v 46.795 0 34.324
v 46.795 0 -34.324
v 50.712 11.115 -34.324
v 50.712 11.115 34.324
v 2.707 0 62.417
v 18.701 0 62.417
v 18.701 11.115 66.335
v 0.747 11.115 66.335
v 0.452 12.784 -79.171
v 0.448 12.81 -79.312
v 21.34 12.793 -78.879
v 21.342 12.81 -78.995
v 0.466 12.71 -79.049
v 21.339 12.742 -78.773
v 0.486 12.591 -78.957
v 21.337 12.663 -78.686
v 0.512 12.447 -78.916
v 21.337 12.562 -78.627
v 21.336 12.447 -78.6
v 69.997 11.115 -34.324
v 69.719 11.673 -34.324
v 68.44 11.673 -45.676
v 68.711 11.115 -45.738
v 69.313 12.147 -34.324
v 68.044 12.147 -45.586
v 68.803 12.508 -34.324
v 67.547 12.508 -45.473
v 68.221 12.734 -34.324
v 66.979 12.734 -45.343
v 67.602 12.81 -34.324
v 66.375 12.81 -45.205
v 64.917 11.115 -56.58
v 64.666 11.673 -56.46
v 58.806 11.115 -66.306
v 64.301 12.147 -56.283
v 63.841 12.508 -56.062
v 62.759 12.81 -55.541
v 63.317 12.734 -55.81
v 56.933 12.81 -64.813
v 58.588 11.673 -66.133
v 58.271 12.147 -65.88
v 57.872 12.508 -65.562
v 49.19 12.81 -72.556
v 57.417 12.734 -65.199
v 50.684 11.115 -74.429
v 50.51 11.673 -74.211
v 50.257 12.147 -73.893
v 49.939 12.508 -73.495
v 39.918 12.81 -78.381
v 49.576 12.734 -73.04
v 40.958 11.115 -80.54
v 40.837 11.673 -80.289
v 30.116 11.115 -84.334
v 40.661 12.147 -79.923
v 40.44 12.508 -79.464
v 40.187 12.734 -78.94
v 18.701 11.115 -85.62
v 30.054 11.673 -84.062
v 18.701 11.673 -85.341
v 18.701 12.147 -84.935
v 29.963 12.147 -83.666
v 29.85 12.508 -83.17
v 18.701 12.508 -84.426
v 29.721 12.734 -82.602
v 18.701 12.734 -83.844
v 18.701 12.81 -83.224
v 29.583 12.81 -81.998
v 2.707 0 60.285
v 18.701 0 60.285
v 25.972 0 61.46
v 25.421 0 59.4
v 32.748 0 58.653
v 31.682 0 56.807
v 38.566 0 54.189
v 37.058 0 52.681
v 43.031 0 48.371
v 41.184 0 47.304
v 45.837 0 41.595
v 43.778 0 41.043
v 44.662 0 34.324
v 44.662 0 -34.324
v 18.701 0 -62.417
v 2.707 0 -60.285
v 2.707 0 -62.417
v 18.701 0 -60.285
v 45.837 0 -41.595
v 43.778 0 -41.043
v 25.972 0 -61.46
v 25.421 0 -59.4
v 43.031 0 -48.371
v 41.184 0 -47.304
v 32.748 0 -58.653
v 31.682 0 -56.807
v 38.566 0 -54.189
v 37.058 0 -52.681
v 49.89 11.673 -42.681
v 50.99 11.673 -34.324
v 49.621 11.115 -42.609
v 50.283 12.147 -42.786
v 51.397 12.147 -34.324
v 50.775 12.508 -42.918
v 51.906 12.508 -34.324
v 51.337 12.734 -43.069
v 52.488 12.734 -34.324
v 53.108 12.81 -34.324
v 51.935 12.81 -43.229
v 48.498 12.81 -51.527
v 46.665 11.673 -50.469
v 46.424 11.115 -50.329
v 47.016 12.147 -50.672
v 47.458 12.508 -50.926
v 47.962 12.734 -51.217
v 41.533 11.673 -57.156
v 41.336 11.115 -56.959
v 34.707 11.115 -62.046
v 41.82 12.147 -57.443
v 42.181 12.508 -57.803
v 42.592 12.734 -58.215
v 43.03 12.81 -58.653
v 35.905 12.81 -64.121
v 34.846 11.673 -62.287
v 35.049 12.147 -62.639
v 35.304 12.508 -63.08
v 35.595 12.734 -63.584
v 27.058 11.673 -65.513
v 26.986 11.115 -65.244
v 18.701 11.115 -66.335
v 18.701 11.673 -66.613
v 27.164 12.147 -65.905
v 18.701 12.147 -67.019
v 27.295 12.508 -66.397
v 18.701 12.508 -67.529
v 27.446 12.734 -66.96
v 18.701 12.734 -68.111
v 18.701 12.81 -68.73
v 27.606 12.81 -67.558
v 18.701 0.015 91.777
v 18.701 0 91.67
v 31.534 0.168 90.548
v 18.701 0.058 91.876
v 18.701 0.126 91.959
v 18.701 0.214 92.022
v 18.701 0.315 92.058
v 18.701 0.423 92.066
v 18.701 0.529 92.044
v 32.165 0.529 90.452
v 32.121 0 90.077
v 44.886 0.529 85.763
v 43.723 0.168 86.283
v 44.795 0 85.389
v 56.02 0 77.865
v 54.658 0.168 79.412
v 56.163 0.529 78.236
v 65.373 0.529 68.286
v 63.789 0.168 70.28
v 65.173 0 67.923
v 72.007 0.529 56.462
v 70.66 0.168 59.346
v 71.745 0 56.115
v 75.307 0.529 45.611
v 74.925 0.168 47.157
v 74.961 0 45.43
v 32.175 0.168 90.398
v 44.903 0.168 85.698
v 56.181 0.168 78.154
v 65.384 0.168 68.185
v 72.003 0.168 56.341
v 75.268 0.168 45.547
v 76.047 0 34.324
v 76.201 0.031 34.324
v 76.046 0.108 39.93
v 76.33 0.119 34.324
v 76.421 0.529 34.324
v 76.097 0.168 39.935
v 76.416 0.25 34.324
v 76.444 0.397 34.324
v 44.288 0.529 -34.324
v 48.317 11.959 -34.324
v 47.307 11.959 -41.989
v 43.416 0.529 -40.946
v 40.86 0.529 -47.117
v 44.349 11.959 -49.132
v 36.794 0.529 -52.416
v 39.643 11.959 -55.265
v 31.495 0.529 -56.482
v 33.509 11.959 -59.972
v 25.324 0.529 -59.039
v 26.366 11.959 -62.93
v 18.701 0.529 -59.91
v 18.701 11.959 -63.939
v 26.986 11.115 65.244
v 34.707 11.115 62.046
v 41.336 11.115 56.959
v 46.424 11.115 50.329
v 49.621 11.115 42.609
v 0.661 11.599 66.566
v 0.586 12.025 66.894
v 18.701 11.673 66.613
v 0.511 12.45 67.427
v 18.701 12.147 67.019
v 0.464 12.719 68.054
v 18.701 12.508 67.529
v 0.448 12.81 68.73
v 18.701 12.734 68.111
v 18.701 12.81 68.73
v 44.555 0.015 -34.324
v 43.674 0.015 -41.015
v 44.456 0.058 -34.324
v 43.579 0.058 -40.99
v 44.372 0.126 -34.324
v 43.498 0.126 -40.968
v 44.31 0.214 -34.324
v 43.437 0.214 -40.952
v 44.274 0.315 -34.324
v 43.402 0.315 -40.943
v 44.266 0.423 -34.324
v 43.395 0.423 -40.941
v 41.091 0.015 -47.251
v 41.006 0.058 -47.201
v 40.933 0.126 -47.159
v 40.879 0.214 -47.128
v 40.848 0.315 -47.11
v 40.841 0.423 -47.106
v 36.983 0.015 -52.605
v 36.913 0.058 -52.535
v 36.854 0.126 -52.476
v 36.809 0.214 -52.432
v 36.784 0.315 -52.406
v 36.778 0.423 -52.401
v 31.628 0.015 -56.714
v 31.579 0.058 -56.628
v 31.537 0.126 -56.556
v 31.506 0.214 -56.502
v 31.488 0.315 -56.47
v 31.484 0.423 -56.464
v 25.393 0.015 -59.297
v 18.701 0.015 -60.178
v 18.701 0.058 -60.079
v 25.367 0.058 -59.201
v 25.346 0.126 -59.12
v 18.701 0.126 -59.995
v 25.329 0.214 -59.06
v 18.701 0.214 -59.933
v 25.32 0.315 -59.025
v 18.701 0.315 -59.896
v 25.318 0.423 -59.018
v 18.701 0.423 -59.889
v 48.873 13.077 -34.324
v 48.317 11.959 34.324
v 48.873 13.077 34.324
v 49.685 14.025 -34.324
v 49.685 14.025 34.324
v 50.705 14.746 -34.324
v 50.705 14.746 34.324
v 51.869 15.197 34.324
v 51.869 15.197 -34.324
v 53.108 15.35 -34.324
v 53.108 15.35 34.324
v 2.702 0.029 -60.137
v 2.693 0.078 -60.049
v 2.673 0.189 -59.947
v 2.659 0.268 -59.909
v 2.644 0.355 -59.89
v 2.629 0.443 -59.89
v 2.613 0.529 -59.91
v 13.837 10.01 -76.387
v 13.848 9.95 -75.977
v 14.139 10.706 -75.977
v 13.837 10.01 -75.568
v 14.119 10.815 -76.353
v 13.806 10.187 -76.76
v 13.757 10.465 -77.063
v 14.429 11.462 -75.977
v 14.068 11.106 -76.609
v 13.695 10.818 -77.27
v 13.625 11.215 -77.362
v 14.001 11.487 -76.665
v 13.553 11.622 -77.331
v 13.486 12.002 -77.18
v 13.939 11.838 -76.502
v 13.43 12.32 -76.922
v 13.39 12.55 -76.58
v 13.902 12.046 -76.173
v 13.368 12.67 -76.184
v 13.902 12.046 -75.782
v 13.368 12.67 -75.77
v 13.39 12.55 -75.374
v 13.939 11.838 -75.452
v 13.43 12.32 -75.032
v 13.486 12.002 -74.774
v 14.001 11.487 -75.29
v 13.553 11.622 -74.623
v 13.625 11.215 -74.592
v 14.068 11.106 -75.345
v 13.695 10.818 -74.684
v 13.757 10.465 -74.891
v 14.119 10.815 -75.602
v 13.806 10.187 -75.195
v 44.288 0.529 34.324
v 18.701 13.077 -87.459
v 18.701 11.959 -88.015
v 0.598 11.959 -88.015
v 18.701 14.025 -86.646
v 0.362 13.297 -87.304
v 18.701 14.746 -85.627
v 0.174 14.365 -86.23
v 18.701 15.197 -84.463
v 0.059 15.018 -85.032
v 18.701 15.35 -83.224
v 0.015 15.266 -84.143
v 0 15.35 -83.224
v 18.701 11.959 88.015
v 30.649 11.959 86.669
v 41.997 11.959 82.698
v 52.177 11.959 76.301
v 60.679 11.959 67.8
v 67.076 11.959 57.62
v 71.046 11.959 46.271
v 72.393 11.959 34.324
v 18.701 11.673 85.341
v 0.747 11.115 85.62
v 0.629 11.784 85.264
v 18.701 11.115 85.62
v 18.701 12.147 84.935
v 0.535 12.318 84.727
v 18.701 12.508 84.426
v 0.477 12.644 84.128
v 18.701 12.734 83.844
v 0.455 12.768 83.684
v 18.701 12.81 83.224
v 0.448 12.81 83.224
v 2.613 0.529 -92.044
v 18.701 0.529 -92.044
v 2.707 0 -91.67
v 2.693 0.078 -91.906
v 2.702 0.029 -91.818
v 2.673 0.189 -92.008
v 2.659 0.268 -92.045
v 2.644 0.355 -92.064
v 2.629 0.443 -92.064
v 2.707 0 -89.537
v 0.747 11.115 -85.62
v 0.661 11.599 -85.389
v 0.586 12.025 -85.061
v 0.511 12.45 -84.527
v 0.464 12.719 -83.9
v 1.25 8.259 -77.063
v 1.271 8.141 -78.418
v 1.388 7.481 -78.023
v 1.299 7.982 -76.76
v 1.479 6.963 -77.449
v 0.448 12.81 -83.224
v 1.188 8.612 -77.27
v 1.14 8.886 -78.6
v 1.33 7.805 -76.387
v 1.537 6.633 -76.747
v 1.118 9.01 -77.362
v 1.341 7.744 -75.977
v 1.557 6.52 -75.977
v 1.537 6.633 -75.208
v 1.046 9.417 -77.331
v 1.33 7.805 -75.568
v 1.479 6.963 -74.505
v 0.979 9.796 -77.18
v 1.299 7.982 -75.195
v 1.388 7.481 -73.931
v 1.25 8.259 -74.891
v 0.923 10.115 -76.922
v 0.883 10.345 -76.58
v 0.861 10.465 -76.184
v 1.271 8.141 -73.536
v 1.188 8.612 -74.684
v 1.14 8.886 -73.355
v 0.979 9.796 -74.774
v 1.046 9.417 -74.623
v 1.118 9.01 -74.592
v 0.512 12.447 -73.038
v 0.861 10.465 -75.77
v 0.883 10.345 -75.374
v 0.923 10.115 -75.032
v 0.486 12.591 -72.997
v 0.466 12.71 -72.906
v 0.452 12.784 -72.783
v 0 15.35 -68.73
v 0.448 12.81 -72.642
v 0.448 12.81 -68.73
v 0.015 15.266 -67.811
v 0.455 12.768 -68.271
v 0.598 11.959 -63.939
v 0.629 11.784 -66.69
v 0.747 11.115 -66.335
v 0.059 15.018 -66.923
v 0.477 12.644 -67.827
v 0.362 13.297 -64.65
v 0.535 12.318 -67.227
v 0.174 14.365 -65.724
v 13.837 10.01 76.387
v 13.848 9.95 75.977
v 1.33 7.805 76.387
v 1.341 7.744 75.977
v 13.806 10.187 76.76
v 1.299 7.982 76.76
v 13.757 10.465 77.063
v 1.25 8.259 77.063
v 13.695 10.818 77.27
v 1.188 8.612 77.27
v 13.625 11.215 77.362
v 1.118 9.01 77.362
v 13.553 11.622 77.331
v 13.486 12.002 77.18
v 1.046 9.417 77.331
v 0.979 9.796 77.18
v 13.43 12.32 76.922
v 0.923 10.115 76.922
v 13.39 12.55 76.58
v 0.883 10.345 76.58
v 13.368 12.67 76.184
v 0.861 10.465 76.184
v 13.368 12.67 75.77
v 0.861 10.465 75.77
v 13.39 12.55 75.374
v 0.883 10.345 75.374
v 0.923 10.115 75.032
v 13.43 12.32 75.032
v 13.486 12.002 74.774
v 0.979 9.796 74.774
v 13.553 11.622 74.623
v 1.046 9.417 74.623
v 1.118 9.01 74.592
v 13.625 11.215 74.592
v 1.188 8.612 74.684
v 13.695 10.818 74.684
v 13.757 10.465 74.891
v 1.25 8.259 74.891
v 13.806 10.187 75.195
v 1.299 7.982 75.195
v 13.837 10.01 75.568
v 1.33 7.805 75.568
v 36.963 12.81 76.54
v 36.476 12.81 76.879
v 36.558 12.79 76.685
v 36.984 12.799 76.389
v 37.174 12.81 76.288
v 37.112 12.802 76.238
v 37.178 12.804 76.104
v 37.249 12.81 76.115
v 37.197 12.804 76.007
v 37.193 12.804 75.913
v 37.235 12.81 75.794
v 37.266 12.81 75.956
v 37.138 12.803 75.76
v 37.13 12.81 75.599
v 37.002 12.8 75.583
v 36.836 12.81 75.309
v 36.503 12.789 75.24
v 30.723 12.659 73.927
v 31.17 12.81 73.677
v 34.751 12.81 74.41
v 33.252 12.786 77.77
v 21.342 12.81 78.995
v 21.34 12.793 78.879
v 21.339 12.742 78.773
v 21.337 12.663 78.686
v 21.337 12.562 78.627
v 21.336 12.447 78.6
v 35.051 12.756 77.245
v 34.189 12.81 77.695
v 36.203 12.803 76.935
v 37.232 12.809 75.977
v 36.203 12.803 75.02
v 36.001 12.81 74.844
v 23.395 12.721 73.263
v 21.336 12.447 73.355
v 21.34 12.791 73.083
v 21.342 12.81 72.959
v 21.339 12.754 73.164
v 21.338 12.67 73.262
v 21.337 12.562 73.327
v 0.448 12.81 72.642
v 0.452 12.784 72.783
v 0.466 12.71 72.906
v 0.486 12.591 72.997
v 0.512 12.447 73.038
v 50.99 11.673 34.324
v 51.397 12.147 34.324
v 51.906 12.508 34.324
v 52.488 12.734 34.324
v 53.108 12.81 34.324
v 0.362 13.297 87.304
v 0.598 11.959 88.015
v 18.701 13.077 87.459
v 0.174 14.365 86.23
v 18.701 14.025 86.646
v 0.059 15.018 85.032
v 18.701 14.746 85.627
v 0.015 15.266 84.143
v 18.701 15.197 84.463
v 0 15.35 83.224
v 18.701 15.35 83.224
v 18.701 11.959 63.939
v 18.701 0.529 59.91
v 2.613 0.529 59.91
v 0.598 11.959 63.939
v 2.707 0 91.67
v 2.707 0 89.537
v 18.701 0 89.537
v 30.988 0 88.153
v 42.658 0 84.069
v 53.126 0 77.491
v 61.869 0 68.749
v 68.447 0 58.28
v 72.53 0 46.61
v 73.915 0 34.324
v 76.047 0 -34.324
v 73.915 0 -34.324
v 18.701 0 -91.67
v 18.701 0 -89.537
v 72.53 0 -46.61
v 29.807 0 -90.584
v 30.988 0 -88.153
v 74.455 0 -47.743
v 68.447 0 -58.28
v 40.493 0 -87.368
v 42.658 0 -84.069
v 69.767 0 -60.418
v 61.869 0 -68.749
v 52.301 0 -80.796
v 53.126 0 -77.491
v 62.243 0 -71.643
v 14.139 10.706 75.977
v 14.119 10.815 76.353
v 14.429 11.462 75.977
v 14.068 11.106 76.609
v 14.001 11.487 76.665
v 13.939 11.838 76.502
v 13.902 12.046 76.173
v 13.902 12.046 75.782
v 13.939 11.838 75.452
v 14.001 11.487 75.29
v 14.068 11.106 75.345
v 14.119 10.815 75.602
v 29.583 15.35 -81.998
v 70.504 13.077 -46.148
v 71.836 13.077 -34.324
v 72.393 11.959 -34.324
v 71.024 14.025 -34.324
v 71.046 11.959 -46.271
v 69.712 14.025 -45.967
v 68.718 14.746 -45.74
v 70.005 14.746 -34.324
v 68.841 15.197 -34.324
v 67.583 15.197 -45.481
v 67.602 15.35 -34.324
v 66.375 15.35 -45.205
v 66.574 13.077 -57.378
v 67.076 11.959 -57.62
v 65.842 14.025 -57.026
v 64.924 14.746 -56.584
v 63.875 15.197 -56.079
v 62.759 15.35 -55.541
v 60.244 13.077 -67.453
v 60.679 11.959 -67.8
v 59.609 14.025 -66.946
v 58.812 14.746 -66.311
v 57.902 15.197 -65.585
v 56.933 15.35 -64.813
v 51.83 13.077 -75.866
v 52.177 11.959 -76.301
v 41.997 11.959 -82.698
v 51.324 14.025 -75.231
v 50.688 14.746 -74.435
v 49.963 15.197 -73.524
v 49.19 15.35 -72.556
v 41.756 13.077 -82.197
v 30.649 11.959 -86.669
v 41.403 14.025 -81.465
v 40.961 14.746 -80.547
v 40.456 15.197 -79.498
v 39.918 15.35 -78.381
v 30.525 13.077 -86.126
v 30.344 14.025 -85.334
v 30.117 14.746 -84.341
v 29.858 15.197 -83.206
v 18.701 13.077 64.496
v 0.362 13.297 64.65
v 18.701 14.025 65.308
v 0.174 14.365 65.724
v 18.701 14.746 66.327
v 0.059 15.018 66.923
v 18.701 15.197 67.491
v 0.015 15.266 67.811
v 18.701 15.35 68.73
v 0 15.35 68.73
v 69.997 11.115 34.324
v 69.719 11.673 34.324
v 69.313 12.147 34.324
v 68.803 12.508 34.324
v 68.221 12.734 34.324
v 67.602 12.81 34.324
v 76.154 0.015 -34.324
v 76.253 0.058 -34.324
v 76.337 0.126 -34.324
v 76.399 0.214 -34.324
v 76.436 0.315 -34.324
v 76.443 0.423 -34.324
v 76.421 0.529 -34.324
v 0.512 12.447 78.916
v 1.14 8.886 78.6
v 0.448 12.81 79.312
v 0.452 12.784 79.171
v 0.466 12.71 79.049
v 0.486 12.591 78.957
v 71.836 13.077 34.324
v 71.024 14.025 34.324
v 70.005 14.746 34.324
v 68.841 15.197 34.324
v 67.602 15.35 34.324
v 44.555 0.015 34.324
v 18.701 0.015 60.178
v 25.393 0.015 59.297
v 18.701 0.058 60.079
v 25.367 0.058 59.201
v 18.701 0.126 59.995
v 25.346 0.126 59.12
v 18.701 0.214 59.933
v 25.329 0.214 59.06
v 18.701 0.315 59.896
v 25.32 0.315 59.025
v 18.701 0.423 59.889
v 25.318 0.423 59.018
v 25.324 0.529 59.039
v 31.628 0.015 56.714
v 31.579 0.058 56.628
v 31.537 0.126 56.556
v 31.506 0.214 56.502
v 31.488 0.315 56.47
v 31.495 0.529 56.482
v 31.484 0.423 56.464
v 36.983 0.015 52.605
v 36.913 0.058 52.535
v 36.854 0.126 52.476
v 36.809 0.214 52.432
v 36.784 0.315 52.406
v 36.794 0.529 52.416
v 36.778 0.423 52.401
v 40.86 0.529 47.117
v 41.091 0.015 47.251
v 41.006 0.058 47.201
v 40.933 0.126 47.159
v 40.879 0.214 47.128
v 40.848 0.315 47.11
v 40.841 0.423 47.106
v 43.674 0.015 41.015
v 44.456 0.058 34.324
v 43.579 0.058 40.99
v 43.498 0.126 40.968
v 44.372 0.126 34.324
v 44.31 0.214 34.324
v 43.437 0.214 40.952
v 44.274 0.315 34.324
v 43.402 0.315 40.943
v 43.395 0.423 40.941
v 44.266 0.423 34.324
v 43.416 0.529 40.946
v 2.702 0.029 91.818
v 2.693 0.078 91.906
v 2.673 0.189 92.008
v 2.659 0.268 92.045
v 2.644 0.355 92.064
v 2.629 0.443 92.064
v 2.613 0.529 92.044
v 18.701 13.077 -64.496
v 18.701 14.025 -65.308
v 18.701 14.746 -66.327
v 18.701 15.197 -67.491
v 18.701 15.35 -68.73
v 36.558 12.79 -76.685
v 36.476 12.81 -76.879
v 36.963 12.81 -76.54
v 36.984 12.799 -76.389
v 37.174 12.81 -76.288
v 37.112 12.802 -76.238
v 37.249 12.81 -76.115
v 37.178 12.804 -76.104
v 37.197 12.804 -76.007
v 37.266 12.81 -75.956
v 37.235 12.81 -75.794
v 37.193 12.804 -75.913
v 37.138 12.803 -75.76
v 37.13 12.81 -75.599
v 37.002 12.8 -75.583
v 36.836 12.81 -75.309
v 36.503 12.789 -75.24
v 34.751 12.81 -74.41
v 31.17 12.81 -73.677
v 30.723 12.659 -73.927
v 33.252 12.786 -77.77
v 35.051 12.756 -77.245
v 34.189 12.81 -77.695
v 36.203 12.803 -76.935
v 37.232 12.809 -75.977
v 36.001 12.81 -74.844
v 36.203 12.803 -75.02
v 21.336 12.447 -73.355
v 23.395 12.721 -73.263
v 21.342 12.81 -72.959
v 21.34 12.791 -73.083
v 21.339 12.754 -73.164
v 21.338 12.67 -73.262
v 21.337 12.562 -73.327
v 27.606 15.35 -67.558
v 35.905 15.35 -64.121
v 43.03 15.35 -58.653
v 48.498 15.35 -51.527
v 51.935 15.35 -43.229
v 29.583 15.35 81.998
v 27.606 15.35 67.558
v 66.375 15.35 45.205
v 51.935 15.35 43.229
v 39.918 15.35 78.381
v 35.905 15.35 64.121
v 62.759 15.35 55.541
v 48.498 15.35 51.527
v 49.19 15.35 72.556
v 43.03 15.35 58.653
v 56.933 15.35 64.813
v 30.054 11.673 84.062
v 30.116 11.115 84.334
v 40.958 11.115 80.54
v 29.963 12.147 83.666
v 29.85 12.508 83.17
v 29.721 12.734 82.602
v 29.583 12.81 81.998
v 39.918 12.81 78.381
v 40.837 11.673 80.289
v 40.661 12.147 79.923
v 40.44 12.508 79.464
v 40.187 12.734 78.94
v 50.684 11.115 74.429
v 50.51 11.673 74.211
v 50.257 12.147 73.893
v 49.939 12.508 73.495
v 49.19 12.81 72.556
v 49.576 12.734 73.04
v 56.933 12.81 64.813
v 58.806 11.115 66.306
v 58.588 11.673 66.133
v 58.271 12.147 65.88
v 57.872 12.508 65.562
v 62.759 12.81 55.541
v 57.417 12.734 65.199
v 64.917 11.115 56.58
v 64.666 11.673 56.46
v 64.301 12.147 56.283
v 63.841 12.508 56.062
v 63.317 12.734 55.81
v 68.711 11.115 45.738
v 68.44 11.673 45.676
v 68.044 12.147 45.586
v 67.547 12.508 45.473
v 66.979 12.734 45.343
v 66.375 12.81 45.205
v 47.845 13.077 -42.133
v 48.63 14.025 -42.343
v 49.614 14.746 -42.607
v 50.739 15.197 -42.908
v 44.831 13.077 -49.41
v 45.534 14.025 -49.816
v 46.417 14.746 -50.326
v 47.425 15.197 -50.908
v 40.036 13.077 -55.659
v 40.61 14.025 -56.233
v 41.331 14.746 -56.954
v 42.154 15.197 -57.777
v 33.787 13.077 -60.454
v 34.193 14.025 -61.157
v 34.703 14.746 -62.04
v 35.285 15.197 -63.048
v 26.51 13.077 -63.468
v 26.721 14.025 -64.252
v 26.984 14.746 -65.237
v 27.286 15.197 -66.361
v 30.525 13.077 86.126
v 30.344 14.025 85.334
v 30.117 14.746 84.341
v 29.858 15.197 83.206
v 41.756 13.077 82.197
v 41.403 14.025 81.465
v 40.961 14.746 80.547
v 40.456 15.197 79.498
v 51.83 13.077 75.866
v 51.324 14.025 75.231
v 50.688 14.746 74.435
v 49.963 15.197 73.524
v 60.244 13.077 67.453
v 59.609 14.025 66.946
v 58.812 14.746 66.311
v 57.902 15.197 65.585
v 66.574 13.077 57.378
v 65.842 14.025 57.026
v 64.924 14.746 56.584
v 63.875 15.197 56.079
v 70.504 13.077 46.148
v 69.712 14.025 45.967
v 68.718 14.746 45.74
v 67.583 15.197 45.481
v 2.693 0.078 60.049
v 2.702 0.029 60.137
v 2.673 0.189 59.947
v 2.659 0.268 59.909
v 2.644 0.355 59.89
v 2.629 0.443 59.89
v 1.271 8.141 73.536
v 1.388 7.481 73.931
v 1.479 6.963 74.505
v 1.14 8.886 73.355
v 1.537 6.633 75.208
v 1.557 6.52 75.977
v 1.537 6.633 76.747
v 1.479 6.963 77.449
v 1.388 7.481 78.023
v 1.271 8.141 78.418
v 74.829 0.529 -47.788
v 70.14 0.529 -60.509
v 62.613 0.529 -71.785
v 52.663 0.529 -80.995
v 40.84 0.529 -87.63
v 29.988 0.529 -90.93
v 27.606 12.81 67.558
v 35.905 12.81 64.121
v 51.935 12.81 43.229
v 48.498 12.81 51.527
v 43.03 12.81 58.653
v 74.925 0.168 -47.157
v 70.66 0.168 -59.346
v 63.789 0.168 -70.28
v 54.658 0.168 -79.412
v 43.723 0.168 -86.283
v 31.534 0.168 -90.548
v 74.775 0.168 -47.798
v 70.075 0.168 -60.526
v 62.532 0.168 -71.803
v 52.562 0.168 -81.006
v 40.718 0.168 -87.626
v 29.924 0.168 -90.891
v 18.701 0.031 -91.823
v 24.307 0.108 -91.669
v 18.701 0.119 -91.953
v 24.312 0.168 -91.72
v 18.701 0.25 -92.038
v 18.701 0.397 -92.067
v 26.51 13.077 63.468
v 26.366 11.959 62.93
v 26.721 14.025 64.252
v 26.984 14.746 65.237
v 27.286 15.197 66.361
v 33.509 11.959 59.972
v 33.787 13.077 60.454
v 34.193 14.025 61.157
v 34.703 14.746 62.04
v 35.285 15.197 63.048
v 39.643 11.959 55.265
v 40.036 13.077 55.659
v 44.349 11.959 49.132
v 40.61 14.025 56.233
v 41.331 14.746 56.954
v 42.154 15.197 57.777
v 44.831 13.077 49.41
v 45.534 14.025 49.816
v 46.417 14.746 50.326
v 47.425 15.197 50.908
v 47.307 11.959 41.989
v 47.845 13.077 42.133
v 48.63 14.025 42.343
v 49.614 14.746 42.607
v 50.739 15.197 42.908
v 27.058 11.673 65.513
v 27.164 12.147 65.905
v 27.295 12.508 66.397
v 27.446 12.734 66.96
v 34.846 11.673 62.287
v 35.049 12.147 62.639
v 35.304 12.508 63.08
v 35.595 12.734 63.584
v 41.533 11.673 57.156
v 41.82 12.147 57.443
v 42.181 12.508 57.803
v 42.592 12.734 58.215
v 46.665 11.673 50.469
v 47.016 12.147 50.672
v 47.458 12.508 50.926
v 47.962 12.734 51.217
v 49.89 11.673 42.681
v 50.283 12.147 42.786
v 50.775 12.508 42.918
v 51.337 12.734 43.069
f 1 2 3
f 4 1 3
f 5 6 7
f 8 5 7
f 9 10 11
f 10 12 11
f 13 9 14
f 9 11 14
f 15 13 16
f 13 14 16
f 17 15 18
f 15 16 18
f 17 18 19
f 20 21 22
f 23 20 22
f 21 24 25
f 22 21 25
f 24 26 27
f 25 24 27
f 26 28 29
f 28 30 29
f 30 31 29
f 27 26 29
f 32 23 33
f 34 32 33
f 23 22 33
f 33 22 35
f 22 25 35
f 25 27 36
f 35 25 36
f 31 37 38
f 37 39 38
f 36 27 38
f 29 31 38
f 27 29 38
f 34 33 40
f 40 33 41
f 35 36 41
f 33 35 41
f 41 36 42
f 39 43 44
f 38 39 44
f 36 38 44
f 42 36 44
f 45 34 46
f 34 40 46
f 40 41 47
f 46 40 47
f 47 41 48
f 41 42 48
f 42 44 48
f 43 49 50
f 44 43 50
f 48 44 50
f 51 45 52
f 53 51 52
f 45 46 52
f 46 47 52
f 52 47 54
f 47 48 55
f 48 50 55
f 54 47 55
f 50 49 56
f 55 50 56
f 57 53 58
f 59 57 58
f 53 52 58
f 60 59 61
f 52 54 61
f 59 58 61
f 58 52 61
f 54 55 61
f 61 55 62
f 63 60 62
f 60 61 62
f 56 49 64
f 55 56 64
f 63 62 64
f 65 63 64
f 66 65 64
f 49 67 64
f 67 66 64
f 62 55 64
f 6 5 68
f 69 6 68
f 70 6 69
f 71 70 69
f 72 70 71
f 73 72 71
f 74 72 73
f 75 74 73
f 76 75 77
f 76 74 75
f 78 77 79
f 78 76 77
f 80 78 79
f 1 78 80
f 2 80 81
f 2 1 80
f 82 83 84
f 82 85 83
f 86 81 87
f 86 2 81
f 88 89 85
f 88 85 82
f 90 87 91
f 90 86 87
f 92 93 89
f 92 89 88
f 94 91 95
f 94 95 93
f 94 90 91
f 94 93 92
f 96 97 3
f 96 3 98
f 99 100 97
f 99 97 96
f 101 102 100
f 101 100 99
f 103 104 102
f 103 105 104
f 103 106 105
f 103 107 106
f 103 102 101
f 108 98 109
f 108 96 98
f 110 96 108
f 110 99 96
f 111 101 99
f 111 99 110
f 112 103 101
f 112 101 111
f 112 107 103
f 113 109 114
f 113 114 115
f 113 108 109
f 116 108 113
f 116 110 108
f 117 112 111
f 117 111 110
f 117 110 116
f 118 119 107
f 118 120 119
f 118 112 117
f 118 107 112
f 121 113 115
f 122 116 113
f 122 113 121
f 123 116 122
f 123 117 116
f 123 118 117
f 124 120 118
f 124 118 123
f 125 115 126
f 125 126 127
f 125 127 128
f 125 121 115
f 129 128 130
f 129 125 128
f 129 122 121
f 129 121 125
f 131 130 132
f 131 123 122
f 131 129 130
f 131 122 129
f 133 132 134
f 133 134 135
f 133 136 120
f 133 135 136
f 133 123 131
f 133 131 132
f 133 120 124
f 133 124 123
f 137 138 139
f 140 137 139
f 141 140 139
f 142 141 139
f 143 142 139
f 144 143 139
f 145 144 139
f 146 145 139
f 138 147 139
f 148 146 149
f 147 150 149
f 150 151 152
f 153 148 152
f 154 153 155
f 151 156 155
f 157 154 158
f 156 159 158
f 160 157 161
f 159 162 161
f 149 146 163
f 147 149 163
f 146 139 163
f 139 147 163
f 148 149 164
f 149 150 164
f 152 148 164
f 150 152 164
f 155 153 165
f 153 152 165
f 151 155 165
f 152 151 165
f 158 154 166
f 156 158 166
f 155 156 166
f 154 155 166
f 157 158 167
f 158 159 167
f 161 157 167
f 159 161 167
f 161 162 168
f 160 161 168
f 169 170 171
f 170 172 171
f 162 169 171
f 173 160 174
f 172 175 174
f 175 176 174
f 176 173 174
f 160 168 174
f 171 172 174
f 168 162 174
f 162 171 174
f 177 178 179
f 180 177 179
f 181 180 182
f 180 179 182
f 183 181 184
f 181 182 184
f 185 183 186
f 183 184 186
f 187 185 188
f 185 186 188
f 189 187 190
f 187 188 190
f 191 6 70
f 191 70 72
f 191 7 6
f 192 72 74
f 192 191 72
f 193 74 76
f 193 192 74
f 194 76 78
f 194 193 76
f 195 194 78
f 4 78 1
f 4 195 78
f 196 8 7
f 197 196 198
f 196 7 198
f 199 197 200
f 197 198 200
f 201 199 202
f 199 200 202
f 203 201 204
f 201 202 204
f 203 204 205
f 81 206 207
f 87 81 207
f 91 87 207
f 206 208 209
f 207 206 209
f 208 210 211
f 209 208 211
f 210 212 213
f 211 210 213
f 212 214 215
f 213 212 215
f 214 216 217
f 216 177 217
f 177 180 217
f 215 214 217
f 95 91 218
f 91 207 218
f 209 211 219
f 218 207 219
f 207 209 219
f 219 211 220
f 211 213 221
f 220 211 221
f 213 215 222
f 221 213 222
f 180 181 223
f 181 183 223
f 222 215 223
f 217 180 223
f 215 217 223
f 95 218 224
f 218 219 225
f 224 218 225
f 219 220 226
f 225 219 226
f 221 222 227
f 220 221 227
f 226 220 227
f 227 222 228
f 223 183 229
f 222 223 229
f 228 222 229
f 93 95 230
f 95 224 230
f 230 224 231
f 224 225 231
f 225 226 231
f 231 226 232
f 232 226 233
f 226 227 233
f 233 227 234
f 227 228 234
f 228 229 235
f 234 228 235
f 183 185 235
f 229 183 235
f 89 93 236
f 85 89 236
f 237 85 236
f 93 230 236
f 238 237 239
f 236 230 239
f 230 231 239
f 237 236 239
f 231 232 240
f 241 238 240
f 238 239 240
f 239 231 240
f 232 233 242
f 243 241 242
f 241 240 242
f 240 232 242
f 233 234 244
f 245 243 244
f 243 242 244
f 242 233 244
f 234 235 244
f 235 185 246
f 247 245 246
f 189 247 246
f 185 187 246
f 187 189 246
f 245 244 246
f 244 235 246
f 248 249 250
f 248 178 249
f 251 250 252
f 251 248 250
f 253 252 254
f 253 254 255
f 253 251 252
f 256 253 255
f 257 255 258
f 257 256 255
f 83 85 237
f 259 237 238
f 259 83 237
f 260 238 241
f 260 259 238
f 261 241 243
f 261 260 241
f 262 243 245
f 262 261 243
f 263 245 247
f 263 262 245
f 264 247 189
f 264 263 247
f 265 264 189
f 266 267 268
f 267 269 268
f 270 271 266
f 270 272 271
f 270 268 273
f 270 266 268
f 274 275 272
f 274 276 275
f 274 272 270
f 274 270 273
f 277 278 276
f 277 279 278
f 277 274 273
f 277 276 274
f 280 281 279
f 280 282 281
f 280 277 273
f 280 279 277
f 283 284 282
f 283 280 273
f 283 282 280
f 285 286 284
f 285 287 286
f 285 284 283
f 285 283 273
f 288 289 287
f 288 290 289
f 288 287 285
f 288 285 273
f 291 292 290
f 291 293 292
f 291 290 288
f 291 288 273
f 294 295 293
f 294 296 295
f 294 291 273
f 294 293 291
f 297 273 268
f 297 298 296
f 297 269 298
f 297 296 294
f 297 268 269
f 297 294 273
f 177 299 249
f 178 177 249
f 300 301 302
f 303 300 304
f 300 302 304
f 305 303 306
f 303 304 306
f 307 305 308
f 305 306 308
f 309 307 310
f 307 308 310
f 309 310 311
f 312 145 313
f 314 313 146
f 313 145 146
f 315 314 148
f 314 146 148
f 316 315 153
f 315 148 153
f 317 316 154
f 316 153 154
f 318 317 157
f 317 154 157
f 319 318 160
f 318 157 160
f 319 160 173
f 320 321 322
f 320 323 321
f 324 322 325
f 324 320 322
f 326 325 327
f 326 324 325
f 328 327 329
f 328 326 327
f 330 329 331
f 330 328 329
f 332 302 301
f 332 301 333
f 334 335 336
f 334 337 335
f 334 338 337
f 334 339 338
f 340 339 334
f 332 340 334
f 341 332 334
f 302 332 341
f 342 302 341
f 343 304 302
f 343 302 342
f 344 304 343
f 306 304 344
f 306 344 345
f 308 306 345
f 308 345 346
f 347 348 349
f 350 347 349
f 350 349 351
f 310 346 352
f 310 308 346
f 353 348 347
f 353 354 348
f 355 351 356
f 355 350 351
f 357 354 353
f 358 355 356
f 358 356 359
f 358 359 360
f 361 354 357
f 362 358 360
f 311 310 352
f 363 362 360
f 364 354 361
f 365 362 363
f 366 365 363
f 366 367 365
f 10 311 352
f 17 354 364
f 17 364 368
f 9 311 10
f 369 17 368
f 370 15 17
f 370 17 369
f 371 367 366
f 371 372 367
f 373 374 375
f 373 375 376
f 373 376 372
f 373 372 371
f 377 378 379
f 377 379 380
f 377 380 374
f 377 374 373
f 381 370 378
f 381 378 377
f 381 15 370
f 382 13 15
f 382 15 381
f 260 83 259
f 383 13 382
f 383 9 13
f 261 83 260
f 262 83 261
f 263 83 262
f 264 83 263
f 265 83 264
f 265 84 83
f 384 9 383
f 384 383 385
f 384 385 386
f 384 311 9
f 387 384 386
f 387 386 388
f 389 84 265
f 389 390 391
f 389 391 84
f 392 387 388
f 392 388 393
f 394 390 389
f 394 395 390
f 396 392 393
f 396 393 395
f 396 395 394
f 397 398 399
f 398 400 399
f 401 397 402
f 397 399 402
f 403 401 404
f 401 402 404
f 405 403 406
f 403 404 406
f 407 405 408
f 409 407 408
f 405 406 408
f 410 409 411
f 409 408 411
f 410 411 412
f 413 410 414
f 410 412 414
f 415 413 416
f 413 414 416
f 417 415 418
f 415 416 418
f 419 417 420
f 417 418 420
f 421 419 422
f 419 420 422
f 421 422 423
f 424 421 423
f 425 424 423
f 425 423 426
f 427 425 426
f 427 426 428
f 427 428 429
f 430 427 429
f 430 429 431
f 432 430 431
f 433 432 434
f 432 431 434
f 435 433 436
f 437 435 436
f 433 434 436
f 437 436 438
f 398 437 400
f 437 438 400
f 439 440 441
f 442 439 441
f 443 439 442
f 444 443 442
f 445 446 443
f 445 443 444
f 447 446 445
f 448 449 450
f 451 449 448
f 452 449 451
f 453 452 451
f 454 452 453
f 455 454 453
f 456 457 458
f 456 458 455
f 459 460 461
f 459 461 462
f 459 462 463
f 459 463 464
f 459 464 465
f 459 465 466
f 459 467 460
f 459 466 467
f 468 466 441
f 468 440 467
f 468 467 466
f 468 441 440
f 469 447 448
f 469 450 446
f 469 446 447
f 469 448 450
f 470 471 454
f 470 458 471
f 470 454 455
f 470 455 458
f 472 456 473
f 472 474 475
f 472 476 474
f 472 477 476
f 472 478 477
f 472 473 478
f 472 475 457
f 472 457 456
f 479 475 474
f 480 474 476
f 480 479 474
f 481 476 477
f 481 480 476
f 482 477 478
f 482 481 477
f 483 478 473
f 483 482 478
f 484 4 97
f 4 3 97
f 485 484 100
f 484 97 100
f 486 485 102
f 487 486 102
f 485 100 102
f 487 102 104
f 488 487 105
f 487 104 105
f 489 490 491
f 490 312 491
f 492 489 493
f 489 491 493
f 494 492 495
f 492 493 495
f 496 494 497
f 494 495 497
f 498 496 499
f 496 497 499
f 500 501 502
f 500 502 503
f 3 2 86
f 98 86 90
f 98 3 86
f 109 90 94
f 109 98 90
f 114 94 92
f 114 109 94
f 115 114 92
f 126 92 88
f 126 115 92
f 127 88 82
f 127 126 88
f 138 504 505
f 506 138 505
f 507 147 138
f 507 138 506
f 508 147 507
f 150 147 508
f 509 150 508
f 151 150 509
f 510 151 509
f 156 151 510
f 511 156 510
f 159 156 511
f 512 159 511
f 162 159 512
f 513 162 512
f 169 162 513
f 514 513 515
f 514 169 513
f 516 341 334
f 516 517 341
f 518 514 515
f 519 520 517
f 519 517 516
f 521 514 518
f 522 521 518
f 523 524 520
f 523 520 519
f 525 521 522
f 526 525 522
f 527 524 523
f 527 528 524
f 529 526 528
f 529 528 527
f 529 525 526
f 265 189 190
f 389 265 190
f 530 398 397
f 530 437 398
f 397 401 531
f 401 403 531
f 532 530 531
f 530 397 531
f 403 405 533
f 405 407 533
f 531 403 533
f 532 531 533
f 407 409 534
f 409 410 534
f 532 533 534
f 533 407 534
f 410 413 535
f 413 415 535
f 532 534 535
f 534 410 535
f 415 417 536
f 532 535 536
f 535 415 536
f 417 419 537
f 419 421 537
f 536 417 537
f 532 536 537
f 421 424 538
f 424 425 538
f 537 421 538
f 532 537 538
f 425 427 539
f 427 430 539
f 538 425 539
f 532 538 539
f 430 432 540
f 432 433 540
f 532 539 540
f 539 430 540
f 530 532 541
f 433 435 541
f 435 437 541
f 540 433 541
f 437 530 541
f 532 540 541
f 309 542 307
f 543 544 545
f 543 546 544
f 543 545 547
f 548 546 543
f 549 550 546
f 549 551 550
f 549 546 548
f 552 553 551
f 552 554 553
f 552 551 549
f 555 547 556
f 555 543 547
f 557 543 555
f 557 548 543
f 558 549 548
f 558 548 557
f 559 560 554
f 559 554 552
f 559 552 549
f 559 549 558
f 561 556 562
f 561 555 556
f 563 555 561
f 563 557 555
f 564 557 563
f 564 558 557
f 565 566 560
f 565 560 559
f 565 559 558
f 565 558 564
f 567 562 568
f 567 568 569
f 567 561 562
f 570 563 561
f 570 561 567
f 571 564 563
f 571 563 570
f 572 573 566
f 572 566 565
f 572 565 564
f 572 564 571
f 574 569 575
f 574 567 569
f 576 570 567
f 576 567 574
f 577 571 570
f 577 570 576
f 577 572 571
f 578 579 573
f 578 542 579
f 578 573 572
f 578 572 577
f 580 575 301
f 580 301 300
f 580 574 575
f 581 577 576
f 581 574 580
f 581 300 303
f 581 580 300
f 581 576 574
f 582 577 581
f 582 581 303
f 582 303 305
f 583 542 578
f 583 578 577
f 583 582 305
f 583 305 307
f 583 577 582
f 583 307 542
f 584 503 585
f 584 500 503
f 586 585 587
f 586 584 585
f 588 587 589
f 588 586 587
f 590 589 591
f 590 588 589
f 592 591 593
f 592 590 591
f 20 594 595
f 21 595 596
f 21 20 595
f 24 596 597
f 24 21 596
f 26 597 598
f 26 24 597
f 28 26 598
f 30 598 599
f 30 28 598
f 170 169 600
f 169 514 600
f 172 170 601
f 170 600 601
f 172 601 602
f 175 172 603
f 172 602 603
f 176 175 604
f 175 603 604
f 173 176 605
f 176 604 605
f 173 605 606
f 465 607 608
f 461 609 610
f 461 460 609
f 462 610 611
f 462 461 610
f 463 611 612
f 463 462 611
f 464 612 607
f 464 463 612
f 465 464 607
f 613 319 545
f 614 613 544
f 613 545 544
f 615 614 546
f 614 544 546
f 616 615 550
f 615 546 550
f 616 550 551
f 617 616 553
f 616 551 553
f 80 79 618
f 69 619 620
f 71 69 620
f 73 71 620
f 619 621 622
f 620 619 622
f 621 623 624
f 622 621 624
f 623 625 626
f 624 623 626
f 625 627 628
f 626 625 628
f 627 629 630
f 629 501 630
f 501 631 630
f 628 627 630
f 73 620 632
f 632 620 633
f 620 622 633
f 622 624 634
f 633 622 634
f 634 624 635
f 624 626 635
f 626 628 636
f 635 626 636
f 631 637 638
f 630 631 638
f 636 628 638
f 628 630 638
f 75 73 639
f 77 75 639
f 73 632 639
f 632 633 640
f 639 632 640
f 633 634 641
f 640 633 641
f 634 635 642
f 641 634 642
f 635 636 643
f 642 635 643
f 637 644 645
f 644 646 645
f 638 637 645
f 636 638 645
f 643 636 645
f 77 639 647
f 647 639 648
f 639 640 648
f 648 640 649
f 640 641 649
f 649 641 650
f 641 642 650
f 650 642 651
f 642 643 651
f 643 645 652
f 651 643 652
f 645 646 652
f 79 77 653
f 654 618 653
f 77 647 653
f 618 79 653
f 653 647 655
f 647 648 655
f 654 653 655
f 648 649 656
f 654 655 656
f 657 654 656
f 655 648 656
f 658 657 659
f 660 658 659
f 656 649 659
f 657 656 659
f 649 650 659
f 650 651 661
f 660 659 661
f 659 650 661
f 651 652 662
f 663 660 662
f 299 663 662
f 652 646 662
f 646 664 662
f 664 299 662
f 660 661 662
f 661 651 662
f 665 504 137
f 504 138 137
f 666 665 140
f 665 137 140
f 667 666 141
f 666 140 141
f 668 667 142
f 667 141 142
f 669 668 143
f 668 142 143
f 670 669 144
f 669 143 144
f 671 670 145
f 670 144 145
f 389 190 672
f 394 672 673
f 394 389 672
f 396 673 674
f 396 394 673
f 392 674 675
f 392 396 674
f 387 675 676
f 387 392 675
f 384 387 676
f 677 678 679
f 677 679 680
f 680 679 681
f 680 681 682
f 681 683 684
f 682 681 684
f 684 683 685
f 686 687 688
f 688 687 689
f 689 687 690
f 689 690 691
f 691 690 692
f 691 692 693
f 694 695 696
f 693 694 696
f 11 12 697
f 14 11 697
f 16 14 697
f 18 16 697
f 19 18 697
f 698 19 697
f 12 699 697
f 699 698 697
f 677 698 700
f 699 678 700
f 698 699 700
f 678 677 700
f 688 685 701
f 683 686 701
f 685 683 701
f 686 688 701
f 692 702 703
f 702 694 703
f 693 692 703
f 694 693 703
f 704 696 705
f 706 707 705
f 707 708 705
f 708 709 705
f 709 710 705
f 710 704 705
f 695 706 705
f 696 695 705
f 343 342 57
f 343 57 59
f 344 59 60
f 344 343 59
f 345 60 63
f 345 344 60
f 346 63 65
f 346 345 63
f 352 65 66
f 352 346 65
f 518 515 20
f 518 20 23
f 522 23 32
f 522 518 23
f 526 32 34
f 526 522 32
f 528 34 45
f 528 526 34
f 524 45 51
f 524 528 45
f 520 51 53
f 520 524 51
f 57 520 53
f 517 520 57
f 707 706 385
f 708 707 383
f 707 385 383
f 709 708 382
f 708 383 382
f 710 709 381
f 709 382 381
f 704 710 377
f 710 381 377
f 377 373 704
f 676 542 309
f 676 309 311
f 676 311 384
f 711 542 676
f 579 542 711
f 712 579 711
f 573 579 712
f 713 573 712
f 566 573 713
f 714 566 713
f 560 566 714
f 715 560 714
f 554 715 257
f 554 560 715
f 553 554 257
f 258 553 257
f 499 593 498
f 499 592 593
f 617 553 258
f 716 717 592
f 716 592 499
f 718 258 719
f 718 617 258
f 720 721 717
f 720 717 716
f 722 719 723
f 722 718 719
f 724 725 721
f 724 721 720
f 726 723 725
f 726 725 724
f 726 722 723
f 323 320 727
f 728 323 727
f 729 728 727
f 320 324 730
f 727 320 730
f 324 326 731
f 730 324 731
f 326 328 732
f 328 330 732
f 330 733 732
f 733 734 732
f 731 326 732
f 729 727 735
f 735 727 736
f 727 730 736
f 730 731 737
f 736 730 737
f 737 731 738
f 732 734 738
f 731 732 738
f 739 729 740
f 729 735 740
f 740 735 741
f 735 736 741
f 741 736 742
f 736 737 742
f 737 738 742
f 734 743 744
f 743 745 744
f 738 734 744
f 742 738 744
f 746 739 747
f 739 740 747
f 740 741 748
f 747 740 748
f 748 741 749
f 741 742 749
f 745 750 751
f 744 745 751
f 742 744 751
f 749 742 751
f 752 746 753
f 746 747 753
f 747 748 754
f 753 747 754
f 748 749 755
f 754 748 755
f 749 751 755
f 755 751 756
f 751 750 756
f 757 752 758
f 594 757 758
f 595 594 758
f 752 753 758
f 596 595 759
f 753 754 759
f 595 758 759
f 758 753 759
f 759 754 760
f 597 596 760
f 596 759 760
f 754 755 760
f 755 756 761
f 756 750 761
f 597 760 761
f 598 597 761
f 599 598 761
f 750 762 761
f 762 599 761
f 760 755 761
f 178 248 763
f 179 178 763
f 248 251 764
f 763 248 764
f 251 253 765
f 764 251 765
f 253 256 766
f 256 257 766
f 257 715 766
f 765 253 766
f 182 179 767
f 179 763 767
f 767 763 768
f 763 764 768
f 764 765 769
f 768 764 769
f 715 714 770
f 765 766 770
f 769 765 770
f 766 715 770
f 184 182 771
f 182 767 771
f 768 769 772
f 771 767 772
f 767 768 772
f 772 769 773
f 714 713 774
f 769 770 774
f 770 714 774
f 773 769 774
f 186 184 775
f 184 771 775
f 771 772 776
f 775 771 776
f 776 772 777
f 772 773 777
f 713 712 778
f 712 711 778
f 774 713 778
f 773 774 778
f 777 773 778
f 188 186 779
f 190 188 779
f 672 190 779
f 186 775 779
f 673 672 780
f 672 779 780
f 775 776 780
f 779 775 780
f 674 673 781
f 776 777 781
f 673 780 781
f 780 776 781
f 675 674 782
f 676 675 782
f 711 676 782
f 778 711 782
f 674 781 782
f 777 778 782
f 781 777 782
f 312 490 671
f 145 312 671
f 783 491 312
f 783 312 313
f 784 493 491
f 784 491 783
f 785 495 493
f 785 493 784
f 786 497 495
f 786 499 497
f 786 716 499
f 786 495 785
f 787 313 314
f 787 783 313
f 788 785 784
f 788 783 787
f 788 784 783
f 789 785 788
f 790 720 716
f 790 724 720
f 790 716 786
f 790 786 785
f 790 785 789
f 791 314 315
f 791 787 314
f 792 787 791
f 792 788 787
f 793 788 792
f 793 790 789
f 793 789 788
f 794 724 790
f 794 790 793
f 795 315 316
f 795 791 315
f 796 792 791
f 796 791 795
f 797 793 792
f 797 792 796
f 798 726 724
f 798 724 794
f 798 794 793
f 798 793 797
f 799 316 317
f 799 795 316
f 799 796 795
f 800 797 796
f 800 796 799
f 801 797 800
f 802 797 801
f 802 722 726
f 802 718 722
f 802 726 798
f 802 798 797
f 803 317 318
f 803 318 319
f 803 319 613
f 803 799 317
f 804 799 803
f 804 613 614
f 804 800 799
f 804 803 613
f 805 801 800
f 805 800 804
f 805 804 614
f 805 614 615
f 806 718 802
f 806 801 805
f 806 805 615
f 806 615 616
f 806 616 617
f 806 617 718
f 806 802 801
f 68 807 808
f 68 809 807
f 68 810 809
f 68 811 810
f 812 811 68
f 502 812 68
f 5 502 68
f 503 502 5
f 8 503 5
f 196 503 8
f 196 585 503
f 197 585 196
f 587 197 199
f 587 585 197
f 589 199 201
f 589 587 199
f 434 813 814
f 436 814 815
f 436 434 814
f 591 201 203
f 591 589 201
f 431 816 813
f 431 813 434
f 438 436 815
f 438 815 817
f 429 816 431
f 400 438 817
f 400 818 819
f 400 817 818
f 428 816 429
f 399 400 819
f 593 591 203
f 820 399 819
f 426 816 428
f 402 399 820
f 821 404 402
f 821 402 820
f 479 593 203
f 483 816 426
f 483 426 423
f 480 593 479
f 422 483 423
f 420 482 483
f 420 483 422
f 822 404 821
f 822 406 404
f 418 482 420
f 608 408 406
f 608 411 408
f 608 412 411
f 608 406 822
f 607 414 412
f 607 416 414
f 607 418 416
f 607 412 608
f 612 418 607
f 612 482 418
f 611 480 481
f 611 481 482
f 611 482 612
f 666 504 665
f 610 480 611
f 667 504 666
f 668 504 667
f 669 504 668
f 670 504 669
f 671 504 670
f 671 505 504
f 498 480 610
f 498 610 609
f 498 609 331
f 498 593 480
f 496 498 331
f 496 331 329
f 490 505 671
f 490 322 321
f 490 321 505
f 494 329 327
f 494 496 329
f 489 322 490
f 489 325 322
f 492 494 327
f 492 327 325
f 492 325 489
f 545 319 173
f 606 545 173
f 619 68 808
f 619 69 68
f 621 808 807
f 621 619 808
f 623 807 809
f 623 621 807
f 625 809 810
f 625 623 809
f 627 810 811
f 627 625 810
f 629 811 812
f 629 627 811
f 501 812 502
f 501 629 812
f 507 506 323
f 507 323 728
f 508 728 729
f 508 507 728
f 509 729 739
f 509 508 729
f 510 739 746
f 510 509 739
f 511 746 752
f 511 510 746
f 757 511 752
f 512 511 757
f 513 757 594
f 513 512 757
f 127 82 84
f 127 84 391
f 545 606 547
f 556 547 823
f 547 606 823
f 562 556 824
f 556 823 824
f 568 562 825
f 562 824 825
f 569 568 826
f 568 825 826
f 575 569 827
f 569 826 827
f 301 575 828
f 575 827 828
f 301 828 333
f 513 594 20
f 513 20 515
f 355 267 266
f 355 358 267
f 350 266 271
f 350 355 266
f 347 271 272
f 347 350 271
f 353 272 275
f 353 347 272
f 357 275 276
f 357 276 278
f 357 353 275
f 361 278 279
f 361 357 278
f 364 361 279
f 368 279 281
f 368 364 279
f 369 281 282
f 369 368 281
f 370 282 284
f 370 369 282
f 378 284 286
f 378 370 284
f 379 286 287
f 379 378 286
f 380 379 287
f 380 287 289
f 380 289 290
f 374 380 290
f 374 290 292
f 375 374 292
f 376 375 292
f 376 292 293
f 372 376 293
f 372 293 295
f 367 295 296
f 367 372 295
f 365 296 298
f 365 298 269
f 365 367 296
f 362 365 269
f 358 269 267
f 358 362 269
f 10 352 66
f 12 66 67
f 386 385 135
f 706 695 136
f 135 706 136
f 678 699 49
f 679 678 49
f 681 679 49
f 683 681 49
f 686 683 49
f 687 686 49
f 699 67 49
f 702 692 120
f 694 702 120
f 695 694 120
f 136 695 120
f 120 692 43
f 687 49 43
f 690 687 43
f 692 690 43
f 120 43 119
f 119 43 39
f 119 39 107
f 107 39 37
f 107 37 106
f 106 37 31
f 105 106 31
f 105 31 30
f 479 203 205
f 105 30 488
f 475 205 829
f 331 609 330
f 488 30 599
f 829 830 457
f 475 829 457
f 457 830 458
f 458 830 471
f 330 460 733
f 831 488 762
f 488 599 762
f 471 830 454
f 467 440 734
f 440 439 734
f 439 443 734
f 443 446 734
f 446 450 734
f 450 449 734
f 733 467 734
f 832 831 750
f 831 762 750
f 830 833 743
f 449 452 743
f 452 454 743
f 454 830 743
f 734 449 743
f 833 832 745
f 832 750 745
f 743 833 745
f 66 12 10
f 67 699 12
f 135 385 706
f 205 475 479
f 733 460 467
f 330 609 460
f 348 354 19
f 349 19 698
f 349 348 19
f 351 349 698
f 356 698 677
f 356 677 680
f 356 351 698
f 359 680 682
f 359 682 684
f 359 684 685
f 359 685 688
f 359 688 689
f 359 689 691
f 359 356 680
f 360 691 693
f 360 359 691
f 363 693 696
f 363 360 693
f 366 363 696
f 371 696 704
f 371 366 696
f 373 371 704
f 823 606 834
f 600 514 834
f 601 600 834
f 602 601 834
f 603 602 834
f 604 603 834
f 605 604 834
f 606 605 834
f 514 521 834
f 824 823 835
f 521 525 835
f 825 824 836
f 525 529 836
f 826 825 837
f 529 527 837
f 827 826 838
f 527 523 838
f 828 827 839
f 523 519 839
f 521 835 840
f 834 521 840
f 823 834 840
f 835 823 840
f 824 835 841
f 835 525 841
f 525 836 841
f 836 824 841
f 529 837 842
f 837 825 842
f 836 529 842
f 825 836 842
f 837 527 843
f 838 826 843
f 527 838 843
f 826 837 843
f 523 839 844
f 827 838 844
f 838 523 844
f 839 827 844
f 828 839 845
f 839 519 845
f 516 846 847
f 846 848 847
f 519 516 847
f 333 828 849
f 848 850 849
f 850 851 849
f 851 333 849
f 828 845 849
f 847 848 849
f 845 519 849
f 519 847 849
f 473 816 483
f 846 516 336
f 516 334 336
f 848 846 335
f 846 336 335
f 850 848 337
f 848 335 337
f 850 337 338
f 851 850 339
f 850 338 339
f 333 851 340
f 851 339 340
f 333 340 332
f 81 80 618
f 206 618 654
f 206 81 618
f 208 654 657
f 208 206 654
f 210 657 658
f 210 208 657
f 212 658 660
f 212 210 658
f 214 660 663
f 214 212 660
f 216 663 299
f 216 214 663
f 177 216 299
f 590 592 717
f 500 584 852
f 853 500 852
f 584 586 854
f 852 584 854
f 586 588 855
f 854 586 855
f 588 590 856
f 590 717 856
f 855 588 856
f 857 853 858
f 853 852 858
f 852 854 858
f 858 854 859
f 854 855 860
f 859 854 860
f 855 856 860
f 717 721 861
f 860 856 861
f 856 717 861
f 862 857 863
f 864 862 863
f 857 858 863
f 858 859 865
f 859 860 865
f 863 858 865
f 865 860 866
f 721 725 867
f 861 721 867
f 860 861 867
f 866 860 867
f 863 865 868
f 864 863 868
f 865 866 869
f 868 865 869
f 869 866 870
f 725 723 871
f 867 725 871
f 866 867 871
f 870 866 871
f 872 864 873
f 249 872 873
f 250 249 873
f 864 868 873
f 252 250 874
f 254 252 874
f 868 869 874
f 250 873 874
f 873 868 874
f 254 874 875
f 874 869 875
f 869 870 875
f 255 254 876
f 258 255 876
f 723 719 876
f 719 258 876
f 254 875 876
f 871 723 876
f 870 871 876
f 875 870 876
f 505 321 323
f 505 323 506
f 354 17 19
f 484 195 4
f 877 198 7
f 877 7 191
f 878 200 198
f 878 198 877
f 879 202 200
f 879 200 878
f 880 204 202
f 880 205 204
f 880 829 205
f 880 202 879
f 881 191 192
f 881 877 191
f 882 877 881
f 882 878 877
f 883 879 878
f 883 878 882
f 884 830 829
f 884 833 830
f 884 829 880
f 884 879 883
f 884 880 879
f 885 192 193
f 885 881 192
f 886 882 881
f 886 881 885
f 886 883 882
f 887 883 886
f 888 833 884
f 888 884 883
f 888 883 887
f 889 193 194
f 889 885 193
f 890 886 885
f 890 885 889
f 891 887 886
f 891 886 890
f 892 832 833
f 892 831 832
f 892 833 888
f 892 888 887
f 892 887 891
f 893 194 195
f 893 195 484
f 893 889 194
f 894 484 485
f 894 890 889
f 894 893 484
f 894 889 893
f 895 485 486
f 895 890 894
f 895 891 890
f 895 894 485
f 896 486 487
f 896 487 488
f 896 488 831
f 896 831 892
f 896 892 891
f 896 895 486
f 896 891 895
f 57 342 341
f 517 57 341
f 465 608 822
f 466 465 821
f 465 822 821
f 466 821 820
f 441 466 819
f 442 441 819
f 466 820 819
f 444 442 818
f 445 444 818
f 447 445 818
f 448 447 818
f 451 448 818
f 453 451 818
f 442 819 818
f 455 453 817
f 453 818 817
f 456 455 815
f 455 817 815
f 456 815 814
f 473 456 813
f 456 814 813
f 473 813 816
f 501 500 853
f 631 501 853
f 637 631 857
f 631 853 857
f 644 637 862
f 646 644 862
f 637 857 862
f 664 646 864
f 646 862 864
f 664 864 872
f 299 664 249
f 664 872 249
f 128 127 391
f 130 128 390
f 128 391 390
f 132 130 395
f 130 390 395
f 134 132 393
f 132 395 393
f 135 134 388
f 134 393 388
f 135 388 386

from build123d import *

# Parameters (mm, degrees)
FILLET1_R      = 5.08
SHELL1_T       = -2.54
EXTRUDE1_REACH = 121.17
FILLET2_R      = 0.396875


with BuildPart() as part:
    # Sweep1: sweep along a path in Sketch2
    with BuildLine(Plane(origin=(0, 0, 0), x_dir=(1, 0, 0), z_dir=(0, 1, 0))) as sweep1_path:
        Line((0, -59.724007387), (18.701415201, -59.724007387))
        ThreePointArc((18.701415201, -59.724007387), (36.661927443, -52.284519629), (44.101415201, -34.324007387))
        Line((44.101415201, -34.324007387), (44.101415201, 34.324007387))
        ThreePointArc((44.101415201, 34.324007387), (36.661927443, 52.284519629), (18.701415201, 59.724007387))
        Line((18.701415201, 59.724007387), (0, 59.724007387))
    # Sketch1 → Sweep1 (sweep)
    with BuildSketch(Plane(origin=(0, 0, 0), x_dir=(0, 0, -1), z_dir=(1, 0, 0))):
        Polygon((-92.230378578, 0), (-59.724007387, 0), (-65.134510769, 15.350234506), (-86.819875195, 15.350234506), align=None)
    sweep(path=sweep1_path.line)

    # SurfaceCut1
    split(bisect_by=Plane(origin=(2.625044703, 0.462866207, 0), x_dir=(0, 0, 1), z_dir=(-0.9848077530122041, -0.17364817766695276, 0)), keep=Keep.BOTTOM)

    # Fillet1
    fillet1_edges = [part.edges().sort_by_distance(p)[0] for p in [
        (55.821599313, 15.350234506, 71.444191499),
        (40.487731075, 15.350234506, 56.11032326),
        (71.19728301, 15.350234506, 0),
        (49.511918584, 15.350234506, 0),
        (55.821599313, 15.350234506, -71.444191499),
        (40.487731075, 15.350234506, -56.11032326),
        (9.350707601, 15.350234506, -86.819875195),
        (9.350707601, 15.350234506, -65.134510769),
        (9.350707601, 15.350234506, 86.819875195),
        (9.350707601, 15.350234506, 65.134510769),
    ]]
    fillet(fillet1_edges, radius=FILLET1_R)

    # Shell1
    shell1_openings = [part.faces().sort_by_distance(p)[0] for p in [
        (45.698397314, 0, 0),
        (1.458578097, 7.07822706, -75.977192982),
        (1.458578097, 7.07822706, 75.977192982),
    ]]
    offset(amount=SHELL1_T, openings=shell1_openings, kind=Kind.INTERSECTION)

    # Sketch4 → Extrude1 (add, up to next)
    with BuildSketch(Plane(origin=(2.625044703, 0.462866207, 0), x_dir=(0, 0, 1), z_dir=(-0.9848077530122041, -0.1736481776669528, 0)), mode=Mode.PRIVATE) as extrude1_sk1:
        with BuildLine():
            Line((-78.948196177, 12.537846358), (-78.59959728, 8.553342733))
            ThreePointArc((-78.59959728, 8.553342733), (-75.977192982, 6.150351924), (-73.354788685, 8.553342733))
            Line((-73.354788685, 8.553342733), (-73.006189788, 12.537846358))
            Line((-73.006189788, 12.537846358), (-78.948196177, 12.537846358))
        make_face()
    extrude1_tool1 = extrude(extrude1_sk1.sketch, amount=-EXTRUDE1_REACH, mode=Mode.PRIVATE) - part.part
    extrude1 = extrude1_tool1.solids().sort_by_distance((0.946808, 9.980618, -75.977193))[0]
    add(extrude1)

    # Sketch5 → 7/64 (0.10938) Diameter Hole1 (revolve, cut)
    with BuildSketch(Plane(origin=(1.099932111, 9.112209524, -75.977192982), x_dir=(0.1736481776669528, -0.9848077530122041, 0), z_dir=(0, 0, 1))):
        Polygon((0, 0), (0, 13.534671108), (1.389126, 12.7), (1.389126, 0), align=None)
    f_7_64_0_10938_diameter_hole1 = revolve(axis=Axis((-5.153597121, 8.009543596, -75.977192982), (0.9848077530122041, 0.17364817766695284, 0)), mode=Mode.SUBTRACT)

    # Mirror1: Extrude1, 7/64 (0.10938) Diameter Hole1 across plane
    add(extrude1.mirror(Plane.XY))
    add(f_7_64_0_10938_diameter_hole1.mirror(Plane.XY), mode=Mode.SUBTRACT)

    # Fillet2
    fillet2_edges = [part.edges().sort_by_distance(p)[0] for p in [
        (36.661927443, 0, 52.284519629),
        (59.647402944, 0, 75.26999513),
        (11.920791464, 12.810234506, -78.773896729),
        (11.920791464, 12.810234506, -73.180489236),
        (37.231090066, 12.810234506, -76.005795341),
        (11.920791464, 12.810234506, 78.773896729),
        (37.231090066, 12.810234506, 76.005795341),
        (11.920791464, 12.810234506, 73.180489236),
        (44.101415201, 0, 0),
        (76.607786392, 0, 0),
        (36.661927443, 0, -52.284519629),
        (59.647402944, 0, -75.26999513),
        (10.704037852, 0, -59.724007387),
        (10.704037852, 0, -92.230378578),
        (10.704037852, 0, 59.724007387),
        (10.704037852, 0, 92.230378578),
    ]]
    fillet(fillet2_edges, radius=FILLET2_R)


solid = part.part
